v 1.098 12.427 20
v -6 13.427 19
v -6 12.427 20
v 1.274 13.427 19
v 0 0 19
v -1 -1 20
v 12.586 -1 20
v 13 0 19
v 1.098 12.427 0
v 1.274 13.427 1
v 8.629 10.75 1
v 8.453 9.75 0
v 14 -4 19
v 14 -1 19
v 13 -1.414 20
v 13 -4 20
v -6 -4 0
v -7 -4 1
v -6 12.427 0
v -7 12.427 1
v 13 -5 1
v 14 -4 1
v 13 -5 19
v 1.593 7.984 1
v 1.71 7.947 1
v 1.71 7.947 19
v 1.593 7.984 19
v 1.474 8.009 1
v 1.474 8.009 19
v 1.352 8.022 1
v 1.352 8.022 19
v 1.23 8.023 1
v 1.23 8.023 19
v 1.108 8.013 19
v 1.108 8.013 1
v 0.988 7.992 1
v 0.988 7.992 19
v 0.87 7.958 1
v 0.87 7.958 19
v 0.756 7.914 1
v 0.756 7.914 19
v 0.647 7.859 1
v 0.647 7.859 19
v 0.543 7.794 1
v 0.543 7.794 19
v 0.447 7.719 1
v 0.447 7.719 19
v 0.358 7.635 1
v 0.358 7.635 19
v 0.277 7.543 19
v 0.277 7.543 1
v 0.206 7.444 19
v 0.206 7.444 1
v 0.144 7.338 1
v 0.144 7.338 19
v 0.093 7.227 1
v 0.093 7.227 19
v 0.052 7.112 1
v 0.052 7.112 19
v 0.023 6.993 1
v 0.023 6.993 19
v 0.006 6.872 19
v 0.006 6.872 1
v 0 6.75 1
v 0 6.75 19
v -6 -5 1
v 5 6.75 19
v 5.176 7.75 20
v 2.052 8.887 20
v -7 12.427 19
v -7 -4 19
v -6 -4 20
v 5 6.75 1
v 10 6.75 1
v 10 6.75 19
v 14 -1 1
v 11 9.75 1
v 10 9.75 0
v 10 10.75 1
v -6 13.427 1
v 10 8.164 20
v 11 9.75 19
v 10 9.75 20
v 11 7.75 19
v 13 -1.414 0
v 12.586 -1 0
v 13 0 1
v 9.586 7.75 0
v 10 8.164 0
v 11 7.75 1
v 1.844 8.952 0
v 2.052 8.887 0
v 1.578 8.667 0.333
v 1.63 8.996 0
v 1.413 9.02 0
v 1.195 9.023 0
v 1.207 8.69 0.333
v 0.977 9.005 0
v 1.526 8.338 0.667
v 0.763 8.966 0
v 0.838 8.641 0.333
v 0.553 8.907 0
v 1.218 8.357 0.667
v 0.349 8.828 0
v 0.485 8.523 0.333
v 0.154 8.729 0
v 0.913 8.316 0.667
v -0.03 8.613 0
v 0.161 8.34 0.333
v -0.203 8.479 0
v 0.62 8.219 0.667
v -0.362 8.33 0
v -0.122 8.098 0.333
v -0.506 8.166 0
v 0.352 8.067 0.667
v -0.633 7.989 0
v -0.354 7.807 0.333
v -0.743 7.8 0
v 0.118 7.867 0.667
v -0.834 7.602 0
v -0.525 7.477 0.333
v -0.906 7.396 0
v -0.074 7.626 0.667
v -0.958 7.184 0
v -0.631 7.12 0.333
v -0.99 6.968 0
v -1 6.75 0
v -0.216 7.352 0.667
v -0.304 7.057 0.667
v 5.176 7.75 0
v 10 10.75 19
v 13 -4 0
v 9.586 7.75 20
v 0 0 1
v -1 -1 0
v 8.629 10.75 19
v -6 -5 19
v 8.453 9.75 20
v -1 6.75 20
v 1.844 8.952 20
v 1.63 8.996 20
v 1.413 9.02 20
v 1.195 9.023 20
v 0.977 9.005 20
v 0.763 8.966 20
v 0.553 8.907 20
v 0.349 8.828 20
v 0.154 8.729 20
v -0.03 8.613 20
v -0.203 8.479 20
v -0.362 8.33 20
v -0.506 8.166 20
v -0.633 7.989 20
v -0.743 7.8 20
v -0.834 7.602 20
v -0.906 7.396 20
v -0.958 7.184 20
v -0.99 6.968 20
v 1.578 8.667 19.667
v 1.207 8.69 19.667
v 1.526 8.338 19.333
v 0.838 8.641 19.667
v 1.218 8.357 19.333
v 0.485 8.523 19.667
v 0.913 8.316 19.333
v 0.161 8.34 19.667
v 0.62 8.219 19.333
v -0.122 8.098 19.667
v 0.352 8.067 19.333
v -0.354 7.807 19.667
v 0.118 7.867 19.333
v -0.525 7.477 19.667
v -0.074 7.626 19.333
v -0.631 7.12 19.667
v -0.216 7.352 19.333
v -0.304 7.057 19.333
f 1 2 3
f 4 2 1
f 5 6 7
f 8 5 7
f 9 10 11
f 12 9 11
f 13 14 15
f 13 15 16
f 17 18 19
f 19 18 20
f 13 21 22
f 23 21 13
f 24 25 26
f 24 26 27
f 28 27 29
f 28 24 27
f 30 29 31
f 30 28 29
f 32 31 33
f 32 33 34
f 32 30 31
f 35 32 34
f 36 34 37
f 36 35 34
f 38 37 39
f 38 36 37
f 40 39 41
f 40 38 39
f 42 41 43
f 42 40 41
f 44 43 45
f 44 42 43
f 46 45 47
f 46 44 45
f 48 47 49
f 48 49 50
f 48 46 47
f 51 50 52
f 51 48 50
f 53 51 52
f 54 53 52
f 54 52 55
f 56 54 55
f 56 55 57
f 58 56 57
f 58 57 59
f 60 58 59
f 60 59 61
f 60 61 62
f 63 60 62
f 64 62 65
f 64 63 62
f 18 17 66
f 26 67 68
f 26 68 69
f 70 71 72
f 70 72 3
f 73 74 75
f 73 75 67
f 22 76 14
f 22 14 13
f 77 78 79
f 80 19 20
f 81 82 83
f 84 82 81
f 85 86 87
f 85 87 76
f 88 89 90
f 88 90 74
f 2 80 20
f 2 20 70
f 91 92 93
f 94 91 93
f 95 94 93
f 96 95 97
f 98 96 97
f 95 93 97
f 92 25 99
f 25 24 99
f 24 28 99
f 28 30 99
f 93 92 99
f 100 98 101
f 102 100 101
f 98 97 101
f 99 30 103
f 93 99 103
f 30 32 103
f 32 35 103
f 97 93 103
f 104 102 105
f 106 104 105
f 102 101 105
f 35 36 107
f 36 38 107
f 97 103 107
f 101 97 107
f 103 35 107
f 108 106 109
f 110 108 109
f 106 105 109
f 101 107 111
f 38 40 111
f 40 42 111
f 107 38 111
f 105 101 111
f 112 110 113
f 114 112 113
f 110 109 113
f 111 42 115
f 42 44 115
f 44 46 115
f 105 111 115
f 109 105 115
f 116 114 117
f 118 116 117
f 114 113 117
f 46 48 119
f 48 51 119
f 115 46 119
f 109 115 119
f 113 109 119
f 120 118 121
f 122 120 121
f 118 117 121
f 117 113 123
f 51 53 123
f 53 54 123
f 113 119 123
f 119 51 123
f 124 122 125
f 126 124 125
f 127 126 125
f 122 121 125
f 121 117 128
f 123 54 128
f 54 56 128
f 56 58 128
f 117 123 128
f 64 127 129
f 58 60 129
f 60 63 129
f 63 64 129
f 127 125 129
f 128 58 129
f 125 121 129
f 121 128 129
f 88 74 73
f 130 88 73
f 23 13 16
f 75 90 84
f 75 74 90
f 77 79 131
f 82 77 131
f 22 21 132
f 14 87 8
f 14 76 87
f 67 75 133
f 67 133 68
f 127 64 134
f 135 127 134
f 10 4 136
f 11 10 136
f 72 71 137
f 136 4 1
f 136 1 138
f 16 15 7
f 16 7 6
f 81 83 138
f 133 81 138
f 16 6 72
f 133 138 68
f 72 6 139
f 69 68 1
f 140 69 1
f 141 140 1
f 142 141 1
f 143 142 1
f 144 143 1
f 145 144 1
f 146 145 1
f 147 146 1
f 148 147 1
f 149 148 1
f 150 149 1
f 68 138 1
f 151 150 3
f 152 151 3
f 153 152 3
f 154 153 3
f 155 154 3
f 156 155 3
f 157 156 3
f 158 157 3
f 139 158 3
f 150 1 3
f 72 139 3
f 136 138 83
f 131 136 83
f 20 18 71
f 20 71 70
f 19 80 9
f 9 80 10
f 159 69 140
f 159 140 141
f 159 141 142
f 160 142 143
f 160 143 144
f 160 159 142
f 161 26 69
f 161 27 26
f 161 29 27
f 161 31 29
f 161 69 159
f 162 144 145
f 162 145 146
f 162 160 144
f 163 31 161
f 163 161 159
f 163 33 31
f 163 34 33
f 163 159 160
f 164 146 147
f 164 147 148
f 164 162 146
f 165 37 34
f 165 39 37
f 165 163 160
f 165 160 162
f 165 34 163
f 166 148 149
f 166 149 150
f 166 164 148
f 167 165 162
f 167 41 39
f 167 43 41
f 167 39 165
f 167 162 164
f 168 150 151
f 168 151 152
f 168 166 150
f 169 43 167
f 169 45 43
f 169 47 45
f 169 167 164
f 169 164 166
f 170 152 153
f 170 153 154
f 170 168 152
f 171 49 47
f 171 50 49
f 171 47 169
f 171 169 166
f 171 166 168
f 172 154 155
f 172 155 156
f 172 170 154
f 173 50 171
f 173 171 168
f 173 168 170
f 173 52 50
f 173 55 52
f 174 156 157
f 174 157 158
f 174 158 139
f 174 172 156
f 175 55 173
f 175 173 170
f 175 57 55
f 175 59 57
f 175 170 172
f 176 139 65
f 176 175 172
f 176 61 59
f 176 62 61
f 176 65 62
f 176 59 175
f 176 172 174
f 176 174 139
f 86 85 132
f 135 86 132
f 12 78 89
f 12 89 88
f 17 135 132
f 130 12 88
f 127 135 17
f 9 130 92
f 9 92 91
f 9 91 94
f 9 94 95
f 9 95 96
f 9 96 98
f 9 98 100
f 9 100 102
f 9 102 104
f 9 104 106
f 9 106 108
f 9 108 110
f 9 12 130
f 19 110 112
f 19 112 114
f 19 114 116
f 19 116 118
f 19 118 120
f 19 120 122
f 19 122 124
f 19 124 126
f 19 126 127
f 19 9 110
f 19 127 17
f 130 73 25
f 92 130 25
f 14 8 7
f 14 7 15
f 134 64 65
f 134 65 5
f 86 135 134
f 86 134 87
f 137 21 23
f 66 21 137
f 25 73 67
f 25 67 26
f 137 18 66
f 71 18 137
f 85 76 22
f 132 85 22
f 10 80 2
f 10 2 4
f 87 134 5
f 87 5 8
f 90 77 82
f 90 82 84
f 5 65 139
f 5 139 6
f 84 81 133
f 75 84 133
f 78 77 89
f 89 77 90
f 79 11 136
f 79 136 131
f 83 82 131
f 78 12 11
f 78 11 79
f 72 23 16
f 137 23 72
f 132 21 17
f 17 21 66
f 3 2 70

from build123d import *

# Parameters (mm, degrees)
BOSS_EXTRUDE1_DEPTH = 20
CHAMFER1_SIZE       = 1
CHAMFER2_SIZE       = 1


with BuildPart() as part:
    # Sketch1 → Boss-Extrude1 (new body)
    with BuildSketch(Plane.XY):
        with BuildLine():
            Line((0, 6.75), (0, 0))
            Line((0, 0), (14, 0))
            Line((14, 0), (14, -5))
            Line((14, -5), (-7, -5))
            Line((-7, -5), (-7, 13.426942406))
            Line((-7, 13.426942406), (1.274273509, 13.426942406))
            Line((1.274273509, 13.426942406), (8.629112323, 10.75))
            Line((8.629112323, 10.75), (11, 10.75))
            Line((11, 10.75), (11, 6.75))
            Line((11, 6.75), (5, 6.75))
            Line((5, 6.75), (1.710100717, 7.947425413))
            ThreePointArc((1.710100717, 7.947425413), (0.543380251, 7.79382375), (0, 6.75))
        make_face()
    extrude(amount=BOSS_EXTRUDE1_DEPTH)

    # Chamfer1
    chamfer1_edges = [part.edges().sort_by_distance(p)[0] for p in [
        (14, 0, 10),
        (11, 6.75, 10),
    ]]
    chamfer(chamfer1_edges, length=CHAMFER1_SIZE)

    # Chamfer2
    chamfer2_edges = [part.edges().sort_by_distance(p)[0] for p in [
        (6.5, 0, 0),
        (3.355050358, 7.348712706, 20),
        (3.5, -5, 0),
        (-7, 4.213471203, 0),
        (-2.862863246, 13.426942406, 0),
        (4.951692916, 12.088471203, 0),
        (9.814556161, 10.75, 0),
        (11, 9.25, 0),
        (3.355050358, 7.348712706, 0),
        (0.543380251, 7.79382375, 0),
        (0, 3.375, 0),
        (11, 9.25, 20),
        (14, -5, 10),
        (-7, -5, 10),
        (-7, 13.426942406, 10),
        (11, 10.75, 10),
        (9.814556161, 10.75, 20),
        (4.951692916, 12.088471203, 20),
        (-2.862863246, 13.426942406, 20),
        (-7, 4.213471203, 20),
        (14, -3, 0),
        (7.5, 6.75, 0),
        (10.5, 7.25, 0),
        (13.5, -0.5, 0),
        (14, -3, 20),
        (7.5, 6.75, 20),
        (10.5, 7.25, 20),
        (3.5, -5, 20),
        (13.5, -0.5, 20),
        (6.5, 0, 20),
        (0, 3.375, 20),
        (0.543380251, 7.79382375, 20),
    ]]
    chamfer(chamfer2_edges, length=CHAMFER2_SIZE)


solid = part.part
